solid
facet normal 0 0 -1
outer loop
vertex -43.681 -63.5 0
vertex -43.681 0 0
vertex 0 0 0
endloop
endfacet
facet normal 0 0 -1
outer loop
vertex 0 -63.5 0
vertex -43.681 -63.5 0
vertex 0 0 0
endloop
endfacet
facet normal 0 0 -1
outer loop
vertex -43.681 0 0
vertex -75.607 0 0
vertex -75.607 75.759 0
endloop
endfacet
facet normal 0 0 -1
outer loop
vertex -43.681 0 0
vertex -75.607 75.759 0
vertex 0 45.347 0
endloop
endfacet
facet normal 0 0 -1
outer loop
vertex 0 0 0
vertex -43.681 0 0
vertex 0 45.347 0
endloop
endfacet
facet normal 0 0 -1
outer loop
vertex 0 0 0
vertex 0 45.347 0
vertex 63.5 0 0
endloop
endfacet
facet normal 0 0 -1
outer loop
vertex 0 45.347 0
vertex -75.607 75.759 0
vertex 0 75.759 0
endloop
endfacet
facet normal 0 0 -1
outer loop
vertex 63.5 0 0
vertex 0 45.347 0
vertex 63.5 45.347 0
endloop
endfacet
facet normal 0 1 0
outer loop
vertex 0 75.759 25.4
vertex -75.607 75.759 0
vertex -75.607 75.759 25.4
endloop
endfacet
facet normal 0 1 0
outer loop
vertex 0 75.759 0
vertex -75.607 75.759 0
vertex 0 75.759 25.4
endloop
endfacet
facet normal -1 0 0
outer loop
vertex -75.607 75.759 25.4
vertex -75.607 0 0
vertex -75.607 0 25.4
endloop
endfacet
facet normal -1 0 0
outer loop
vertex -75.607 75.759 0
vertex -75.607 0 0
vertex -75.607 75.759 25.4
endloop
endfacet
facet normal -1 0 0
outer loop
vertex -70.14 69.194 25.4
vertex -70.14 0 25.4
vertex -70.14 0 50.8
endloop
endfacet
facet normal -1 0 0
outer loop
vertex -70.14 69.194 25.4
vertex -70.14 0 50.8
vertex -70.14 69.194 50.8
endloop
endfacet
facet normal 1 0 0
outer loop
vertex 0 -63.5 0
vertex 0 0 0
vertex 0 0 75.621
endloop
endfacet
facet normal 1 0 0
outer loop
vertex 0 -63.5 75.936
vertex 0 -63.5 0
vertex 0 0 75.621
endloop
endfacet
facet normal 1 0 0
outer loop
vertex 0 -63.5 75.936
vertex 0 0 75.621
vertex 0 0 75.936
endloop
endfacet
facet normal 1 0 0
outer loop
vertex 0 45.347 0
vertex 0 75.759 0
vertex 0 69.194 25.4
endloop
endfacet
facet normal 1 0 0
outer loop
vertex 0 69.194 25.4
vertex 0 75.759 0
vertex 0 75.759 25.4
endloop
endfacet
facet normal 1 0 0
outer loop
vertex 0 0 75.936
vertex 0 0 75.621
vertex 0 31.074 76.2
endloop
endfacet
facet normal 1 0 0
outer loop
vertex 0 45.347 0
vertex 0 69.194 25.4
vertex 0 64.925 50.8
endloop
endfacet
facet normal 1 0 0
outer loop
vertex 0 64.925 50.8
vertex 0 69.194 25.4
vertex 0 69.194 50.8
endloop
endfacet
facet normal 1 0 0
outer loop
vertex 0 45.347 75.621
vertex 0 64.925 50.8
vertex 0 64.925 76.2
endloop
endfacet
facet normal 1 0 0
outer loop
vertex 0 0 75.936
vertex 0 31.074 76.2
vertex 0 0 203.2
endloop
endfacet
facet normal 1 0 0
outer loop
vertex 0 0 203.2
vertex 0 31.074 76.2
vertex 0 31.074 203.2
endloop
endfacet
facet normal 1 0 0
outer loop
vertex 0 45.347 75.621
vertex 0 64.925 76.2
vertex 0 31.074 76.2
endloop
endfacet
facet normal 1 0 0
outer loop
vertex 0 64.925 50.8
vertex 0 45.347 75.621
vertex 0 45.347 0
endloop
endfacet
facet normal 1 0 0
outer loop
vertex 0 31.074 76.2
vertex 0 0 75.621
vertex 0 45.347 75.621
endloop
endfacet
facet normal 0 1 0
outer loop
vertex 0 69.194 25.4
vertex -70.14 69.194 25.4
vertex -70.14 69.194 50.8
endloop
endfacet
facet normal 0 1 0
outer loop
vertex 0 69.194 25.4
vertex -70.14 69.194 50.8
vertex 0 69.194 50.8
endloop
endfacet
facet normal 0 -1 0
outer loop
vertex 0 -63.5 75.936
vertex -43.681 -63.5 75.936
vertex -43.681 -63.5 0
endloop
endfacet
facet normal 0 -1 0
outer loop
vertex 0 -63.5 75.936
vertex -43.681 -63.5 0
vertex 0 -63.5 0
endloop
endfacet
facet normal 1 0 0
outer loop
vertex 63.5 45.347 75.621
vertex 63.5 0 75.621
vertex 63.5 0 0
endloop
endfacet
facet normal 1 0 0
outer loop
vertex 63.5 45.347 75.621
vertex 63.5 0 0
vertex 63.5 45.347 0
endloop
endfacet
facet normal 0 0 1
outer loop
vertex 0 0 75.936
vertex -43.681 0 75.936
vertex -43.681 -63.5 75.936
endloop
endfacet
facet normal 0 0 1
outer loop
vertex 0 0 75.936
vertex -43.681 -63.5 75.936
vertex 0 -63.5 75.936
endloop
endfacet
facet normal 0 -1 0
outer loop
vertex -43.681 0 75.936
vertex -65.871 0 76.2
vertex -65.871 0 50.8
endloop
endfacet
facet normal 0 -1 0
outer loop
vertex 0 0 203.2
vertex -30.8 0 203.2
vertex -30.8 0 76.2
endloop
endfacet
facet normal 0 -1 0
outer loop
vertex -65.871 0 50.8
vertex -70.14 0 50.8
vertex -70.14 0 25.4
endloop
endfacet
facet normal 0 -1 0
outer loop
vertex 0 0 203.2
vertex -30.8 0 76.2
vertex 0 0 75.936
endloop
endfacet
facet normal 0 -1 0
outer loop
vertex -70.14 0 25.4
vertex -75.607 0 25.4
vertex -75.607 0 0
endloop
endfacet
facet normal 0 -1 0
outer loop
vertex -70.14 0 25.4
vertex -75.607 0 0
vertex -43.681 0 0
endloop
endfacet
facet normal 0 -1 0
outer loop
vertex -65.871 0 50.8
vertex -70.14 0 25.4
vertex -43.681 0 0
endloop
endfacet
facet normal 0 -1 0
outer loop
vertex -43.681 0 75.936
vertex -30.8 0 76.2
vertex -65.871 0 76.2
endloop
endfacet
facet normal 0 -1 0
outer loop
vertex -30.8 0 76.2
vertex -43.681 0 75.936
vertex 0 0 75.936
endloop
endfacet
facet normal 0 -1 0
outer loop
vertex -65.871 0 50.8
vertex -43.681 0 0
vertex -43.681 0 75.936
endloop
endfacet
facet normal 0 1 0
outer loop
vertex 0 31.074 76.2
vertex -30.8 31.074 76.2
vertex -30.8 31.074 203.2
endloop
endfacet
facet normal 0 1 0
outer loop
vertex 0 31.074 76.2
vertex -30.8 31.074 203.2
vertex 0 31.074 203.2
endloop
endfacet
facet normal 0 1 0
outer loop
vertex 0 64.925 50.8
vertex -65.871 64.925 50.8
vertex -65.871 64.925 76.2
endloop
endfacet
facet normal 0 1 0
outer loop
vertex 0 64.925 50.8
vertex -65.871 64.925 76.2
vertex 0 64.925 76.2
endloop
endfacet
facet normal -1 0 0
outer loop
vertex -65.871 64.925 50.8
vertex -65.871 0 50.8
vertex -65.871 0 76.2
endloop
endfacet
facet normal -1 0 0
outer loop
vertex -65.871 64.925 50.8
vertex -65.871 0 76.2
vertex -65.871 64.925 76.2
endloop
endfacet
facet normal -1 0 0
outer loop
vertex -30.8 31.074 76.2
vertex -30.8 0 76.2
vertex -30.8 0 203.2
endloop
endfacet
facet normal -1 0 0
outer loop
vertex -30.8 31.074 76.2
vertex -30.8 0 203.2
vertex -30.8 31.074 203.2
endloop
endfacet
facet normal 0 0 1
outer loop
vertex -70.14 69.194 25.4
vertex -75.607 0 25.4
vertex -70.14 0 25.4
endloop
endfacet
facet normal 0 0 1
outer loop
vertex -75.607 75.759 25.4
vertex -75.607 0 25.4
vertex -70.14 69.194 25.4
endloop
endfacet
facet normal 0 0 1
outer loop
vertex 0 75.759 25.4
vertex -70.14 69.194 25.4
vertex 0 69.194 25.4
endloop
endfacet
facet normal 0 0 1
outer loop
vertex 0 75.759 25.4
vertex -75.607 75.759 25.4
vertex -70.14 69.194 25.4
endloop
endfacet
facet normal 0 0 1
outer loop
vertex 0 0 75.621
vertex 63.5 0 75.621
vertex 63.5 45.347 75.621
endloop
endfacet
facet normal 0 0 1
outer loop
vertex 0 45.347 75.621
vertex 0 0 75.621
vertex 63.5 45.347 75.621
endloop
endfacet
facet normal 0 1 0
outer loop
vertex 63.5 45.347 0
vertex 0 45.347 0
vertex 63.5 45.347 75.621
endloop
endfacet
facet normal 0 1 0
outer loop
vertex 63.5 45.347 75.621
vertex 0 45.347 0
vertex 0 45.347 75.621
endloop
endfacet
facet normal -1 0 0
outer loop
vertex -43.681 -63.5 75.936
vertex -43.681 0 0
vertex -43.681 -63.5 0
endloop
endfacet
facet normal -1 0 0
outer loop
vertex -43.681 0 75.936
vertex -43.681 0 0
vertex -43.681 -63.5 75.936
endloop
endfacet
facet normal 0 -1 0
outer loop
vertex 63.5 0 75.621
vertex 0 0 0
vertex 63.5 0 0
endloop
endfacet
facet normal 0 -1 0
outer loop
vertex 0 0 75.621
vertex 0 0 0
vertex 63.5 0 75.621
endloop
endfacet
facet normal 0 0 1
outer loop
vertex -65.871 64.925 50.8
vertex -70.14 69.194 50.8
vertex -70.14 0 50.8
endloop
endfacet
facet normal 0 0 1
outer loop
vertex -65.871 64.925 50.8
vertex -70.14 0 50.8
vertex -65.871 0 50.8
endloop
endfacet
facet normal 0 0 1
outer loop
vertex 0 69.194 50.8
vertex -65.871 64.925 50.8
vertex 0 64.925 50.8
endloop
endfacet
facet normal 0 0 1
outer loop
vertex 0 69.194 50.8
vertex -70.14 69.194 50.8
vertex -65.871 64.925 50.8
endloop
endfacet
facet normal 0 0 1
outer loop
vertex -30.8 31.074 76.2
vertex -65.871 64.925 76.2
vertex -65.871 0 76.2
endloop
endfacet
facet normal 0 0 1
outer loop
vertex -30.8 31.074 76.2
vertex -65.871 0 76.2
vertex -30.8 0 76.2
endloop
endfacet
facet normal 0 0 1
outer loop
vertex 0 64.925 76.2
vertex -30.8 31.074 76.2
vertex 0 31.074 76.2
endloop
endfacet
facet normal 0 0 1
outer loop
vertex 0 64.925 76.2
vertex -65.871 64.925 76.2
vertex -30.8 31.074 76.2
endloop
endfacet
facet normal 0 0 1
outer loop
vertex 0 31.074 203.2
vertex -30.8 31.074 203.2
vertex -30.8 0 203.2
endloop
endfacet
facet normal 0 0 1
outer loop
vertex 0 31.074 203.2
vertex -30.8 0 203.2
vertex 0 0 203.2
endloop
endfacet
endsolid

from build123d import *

# Parameters (mm, degrees)
F0_W      = 75.6071731448
F0_H      = 75.7589936256
F1_DEPTH  = 25.4
F2_W      = 70.1403468847
F2_H      = 69.1941156983
F3_DEPTH  = 25.4
F4_W      = 65.8708810806
F4_H      = 64.9246573448
F5_DEPTH  = 25.4
F6_W      = 30.8003034443
F6_H      = 31.0739278793
F7_DEPTH  = 127
F8_W      = 43.6810515821
F8_H      = 75.9361535311
F9_DEPTH  = 63.5
F10_W     = 45.3466251493
F10_H     = 75.6209716201
F11_DEPTH = 63.5


with BuildPart() as f1:
    # F0 (on Top) → F1 (new body)
    with BuildSketch(Plane.XY):
        with Locations((-37.8035865724, 37.8794968128)):
            Rectangle(F0_W, F0_H)
    extrude(amount=F1_DEPTH)

    # F2 (on face) → F3 (join)
    with BuildSketch(Plane.XY.offset(25.4)):
        with Locations((-35.0701734424, 34.5970578492)):
            Rectangle(F2_W, F2_H)
    extrude(amount=F3_DEPTH)

    # F4 (on face) → F5 (join)
    with BuildSketch(Plane.XY.offset(50.8)):
        with Locations((-32.9354405403, 32.4623286724)):
            Rectangle(F4_W, F4_H)
    extrude(amount=F5_DEPTH)

    # F6 (on face) → F7 (join)
    with BuildSketch(Plane.XY.offset(76.2)):
        with Locations((-15.4001517221, 15.5369639397)):
            Rectangle(F6_W, F6_H)
    extrude(amount=F7_DEPTH)

    # F8 (on Front) → F9 (join)
    with BuildSketch(Plane.XZ):
        with Locations((-21.840525791, 37.9680767655)):
            Rectangle(F8_W, F8_H)
    extrude(amount=F9_DEPTH)

    # F10 (on Right) → F11 (join)
    with BuildSketch(Plane.YZ):
        with Locations((22.6733125746, 37.81048581)):
            Rectangle(F10_W, F10_H)
    extrude(amount=F11_DEPTH)


solid = f1.part
